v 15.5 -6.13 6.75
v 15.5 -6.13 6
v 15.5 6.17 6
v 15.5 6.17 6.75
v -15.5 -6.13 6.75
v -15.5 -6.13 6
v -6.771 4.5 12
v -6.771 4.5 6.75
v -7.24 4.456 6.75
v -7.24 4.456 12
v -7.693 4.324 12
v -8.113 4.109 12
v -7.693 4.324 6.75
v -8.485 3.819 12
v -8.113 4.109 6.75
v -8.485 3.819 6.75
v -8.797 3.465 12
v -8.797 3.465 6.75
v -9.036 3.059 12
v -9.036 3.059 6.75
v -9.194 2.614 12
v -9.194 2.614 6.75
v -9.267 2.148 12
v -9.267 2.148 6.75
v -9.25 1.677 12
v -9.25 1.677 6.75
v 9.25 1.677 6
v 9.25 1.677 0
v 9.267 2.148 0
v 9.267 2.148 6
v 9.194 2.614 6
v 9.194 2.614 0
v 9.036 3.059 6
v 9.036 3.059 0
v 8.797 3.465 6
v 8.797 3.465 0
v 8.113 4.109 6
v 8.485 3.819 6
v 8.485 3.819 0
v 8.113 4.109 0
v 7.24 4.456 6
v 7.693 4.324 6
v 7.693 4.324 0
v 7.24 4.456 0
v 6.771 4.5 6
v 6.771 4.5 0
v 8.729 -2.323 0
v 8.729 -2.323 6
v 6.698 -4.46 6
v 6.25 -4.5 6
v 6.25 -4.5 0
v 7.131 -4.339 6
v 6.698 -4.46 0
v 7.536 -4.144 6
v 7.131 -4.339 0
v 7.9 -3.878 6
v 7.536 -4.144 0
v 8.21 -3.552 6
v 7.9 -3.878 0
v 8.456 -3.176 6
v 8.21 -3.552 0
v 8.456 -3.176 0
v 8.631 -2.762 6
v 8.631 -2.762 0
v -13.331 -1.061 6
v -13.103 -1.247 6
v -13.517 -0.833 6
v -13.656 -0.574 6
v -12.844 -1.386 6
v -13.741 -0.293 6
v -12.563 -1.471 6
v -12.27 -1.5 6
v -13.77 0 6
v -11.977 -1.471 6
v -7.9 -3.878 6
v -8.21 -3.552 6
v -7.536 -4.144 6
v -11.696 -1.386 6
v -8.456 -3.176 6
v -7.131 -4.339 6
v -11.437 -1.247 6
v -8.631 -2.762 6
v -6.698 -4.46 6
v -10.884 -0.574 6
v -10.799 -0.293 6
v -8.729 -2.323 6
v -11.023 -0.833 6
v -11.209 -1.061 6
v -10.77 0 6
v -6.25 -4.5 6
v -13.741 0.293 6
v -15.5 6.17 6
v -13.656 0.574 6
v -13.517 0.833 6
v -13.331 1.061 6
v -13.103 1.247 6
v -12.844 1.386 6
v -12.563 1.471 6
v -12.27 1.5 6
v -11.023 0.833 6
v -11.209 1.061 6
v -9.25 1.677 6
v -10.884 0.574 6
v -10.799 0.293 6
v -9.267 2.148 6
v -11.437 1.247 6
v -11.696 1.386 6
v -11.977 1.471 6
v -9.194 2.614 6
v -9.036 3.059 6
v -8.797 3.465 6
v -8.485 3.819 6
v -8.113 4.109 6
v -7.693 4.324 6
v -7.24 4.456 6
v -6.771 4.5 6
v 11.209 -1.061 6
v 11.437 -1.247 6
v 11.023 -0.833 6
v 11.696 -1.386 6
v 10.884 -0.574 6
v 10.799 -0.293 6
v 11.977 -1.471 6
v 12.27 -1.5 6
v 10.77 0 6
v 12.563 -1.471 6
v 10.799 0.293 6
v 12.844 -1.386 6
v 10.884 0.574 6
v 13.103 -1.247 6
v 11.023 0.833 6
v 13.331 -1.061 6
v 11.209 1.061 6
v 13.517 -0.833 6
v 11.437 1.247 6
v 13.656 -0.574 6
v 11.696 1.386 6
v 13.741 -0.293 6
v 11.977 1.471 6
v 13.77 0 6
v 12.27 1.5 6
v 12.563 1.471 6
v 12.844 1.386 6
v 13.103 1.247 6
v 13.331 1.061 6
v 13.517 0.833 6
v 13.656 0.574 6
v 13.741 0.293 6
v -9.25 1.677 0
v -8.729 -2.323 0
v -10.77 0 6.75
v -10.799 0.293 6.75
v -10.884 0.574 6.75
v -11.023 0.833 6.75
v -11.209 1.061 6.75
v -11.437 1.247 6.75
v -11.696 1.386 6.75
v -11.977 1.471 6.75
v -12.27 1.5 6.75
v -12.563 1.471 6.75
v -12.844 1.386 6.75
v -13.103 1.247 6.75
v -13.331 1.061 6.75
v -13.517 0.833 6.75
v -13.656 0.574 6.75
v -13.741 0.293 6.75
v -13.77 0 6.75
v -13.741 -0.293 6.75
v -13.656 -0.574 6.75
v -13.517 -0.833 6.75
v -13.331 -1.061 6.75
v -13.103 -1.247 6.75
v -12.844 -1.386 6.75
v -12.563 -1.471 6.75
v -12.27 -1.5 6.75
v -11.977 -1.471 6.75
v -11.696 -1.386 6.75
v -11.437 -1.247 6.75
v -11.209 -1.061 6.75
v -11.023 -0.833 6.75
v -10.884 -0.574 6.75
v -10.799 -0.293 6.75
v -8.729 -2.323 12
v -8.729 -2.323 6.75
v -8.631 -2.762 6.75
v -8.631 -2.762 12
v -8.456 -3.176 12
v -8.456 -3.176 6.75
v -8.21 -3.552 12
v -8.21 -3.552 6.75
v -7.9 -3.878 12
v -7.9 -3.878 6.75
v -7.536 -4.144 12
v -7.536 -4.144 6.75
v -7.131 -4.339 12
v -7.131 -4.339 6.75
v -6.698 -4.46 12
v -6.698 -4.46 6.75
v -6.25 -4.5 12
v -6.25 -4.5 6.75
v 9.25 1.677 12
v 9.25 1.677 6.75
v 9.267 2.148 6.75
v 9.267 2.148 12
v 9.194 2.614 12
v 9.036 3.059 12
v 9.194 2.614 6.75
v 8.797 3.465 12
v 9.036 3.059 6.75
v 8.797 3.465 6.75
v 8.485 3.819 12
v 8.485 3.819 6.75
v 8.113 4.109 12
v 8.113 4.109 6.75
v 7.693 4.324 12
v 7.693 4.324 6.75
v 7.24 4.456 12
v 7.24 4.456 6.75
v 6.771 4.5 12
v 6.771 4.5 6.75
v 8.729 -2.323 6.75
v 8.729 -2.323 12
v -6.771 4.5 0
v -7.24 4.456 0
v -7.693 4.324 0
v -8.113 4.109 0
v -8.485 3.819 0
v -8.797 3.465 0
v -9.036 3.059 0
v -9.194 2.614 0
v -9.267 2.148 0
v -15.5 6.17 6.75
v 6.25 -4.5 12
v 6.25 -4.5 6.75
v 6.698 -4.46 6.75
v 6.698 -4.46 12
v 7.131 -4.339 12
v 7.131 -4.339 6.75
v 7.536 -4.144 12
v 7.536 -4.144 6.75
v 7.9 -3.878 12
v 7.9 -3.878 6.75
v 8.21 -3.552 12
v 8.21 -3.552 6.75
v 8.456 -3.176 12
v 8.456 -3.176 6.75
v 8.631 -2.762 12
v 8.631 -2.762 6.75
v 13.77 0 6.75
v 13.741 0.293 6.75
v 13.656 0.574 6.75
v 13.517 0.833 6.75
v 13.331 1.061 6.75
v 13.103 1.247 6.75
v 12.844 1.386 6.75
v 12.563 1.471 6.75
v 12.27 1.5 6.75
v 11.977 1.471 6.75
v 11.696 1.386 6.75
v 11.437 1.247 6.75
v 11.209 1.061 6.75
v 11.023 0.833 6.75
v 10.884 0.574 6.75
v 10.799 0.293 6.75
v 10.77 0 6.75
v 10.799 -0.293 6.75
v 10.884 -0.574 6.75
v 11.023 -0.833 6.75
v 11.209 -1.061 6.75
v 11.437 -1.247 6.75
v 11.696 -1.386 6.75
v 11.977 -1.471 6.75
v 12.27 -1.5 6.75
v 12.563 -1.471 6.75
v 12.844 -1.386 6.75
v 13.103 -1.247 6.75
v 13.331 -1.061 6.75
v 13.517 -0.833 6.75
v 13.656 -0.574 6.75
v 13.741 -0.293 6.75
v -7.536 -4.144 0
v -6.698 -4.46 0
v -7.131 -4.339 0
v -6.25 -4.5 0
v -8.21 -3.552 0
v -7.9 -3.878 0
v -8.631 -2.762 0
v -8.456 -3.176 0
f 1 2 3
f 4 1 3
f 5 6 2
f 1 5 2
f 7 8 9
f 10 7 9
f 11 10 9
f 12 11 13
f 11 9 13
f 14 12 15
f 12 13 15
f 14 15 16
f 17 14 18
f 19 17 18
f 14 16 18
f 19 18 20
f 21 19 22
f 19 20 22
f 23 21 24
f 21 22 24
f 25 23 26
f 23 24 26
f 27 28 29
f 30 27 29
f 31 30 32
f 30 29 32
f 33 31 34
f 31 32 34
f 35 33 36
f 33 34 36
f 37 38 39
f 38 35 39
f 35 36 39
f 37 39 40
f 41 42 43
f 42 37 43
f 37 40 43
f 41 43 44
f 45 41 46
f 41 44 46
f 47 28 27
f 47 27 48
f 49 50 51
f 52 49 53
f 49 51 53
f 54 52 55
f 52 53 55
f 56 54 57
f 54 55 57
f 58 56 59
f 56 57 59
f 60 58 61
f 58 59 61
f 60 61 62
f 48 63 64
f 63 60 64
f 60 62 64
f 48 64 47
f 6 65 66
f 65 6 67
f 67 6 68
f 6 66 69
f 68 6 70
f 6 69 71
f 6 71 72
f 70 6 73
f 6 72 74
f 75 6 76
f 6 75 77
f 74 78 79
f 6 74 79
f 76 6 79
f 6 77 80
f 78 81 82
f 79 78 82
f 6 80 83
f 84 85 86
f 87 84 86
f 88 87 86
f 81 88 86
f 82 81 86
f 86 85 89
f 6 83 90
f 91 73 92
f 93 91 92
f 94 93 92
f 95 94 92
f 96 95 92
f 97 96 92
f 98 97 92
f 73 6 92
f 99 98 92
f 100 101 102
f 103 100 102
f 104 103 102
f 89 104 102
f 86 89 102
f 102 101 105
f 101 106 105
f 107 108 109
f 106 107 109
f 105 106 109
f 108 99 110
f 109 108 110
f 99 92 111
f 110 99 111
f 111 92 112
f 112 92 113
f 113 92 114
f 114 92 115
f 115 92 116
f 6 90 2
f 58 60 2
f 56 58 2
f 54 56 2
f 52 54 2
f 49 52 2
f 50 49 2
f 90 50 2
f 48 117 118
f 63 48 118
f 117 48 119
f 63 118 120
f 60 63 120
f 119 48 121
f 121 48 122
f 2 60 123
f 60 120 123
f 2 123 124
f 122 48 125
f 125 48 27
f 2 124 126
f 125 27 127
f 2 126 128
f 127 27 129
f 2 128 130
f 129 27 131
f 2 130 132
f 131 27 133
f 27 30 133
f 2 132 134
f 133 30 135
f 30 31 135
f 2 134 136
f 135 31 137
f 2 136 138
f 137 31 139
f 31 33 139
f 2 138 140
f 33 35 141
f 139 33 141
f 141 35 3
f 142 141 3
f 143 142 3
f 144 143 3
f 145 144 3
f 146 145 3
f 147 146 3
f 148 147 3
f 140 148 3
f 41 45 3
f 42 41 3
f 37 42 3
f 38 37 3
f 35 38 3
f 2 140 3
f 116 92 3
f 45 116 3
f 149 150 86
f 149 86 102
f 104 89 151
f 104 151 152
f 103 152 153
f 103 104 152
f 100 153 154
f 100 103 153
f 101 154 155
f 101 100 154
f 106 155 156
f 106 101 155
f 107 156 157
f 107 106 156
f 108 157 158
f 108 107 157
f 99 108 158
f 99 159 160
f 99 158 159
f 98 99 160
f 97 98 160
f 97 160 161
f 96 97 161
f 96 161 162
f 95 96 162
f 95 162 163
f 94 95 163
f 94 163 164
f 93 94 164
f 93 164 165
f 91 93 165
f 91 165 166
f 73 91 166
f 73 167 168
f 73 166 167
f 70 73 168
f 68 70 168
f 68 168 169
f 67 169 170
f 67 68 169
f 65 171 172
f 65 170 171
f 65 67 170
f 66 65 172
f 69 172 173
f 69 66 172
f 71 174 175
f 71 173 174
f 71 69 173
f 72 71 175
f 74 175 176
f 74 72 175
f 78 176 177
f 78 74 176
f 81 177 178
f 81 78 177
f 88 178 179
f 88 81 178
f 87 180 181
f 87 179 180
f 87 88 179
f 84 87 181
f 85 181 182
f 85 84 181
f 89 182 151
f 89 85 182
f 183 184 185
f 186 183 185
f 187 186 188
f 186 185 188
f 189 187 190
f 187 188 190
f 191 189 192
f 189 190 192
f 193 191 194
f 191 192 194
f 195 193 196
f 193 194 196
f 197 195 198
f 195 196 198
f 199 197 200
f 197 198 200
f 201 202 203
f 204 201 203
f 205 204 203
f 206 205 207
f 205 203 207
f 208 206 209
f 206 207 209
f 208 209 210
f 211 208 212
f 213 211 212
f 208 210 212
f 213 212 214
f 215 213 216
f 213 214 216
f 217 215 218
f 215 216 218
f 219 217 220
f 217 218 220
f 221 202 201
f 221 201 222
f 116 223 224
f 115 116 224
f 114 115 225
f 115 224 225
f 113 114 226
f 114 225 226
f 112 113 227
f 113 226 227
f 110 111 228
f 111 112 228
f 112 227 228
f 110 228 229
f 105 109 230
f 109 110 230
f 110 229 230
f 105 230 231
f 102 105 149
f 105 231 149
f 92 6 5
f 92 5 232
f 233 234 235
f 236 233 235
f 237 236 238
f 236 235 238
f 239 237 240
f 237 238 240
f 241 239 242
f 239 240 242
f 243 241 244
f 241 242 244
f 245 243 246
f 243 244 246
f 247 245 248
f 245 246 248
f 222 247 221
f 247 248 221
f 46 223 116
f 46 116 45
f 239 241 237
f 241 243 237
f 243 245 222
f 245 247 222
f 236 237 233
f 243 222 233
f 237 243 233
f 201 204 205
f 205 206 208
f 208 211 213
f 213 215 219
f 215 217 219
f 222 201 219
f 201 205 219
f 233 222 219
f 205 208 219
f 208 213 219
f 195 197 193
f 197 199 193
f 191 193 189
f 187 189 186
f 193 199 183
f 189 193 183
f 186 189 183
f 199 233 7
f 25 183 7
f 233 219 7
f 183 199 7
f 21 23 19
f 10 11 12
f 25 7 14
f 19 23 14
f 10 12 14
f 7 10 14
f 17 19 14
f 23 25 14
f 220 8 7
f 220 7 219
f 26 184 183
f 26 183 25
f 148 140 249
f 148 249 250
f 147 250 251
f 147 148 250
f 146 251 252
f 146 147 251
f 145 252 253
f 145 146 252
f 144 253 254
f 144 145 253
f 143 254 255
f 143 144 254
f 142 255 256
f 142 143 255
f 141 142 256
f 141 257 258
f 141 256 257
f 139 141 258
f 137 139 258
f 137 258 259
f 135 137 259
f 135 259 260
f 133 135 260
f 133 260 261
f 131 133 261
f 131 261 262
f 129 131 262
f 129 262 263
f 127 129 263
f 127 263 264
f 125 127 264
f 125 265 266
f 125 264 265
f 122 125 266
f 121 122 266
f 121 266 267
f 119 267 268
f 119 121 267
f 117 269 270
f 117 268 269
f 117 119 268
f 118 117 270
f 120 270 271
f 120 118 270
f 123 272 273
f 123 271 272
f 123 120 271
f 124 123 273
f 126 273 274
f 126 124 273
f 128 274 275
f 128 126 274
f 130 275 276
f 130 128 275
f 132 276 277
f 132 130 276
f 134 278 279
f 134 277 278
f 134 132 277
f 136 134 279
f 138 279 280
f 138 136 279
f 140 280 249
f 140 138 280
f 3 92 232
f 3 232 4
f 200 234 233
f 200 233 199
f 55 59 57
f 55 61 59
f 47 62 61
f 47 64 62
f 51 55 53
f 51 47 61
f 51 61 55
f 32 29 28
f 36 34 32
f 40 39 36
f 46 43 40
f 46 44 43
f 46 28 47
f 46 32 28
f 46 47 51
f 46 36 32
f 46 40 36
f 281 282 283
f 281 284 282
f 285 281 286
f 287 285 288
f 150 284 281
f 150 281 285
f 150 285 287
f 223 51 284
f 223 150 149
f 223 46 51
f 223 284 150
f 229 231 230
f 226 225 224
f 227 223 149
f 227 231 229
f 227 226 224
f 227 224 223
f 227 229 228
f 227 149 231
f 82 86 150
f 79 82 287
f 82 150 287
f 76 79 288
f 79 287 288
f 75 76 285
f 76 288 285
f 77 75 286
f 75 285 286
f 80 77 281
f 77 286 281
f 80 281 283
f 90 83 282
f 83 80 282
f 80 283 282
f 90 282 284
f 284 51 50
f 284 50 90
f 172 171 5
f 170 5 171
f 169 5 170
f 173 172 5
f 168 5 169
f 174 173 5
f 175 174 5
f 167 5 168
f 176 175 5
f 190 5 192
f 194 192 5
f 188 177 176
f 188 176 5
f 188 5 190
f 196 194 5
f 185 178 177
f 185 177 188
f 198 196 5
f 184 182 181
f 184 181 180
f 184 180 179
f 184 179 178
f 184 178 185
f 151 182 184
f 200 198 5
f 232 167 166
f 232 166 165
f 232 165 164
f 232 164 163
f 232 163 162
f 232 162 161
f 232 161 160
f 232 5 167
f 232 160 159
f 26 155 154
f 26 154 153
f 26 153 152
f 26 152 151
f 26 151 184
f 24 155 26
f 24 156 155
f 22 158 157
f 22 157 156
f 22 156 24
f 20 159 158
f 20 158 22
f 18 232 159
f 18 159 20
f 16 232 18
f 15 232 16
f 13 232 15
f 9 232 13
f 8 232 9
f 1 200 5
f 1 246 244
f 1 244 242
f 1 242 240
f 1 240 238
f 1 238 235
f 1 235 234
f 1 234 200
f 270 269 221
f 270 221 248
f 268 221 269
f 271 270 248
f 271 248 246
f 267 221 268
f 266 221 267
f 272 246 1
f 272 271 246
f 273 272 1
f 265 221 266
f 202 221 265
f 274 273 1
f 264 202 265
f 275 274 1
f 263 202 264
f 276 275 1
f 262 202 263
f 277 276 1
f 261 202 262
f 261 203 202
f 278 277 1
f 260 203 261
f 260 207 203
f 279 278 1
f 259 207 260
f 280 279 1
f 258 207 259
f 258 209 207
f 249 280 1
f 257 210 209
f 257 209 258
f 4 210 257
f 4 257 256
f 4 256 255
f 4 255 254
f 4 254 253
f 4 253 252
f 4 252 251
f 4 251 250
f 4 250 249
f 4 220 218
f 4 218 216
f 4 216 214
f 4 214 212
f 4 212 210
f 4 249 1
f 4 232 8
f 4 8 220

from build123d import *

# Parameters (mm, degrees)
CYLINDER001_R     = 1.5
CYLINDER001_DEPTH = 10
CYLINDER_R        = 1.5
CYLINDER_DEPTH    = 10
EXTRUDE_DEPTH     = 12
BOX_W             = 31
BOX_H             = 12.3
BOX_DEPTH         = 0.75


with BuildPart() as screw_hole2:
    # Cylinder001 → Cylinder001 (new body)
    with BuildSketch(Plane(origin=(12.27, 0, 0), x_dir=(1, 0, 0), z_dir=(0, 0, 1))):
        Circle(CYLINDER001_R)
    extrude(amount=CYLINDER001_DEPTH)


with BuildPart() as screw_hole1:
    # Cylinder → Cylinder (new body)
    with BuildSketch(Plane(origin=(-12.27, 0, 0), x_dir=(1, 0, 0), z_dir=(0, 0, 1))):
        Circle(CYLINDER_R)
    extrude(amount=CYLINDER_DEPTH)


with BuildPart() as extrude_body:
    # Sketch → Extrude (new body)
    with BuildSketch(Plane.XY):
        with BuildLine():
            Line((-6.770935, 4.5), (6.770935, 4.5))
            ThreePointArc((9.25, 1.677142), (8.649385, 3.649675), (6.770935, 4.5))
            Line((9.25, 1.677142), (8.729065, -2.322858))
            ThreePointArc((6.25, -4.5), (7.899675, -3.878449), (8.729065, -2.322858))
            Line((6.25, -4.5), (-6.25, -4.5))
            ThreePointArc((-8.729065, -2.322858), (-7.899675, -3.878449), (-6.25, -4.5))
            Line((-8.729065, -2.322858), (-9.25, 1.677142))
            ThreePointArc((-6.770935, 4.5), (-8.649385, 3.649675), (-9.25, 1.677142))
        make_face()
    extrude(amount=EXTRUDE_DEPTH)


with BuildPart() as db9_connector:
    # Box → Box (new body)
    with BuildSketch(Plane(origin=(-15.5, -6.13, 6), x_dir=(1, 0, 0), z_dir=(0, 0, 1))):
        with Locations((15.5, 6.15)):
            Rectangle(BOX_W, BOX_H)
    extrude(amount=BOX_DEPTH)

    # Fusion: union Extrude body
    add(extrude_body.part)

    # Cut: cut screw_hole1
    add(screw_hole1.part, mode=Mode.SUBTRACT)

    # Cut001: cut screw_hole2
    add(screw_hole2.part, mode=Mode.SUBTRACT)


solid = db9_connector.part
